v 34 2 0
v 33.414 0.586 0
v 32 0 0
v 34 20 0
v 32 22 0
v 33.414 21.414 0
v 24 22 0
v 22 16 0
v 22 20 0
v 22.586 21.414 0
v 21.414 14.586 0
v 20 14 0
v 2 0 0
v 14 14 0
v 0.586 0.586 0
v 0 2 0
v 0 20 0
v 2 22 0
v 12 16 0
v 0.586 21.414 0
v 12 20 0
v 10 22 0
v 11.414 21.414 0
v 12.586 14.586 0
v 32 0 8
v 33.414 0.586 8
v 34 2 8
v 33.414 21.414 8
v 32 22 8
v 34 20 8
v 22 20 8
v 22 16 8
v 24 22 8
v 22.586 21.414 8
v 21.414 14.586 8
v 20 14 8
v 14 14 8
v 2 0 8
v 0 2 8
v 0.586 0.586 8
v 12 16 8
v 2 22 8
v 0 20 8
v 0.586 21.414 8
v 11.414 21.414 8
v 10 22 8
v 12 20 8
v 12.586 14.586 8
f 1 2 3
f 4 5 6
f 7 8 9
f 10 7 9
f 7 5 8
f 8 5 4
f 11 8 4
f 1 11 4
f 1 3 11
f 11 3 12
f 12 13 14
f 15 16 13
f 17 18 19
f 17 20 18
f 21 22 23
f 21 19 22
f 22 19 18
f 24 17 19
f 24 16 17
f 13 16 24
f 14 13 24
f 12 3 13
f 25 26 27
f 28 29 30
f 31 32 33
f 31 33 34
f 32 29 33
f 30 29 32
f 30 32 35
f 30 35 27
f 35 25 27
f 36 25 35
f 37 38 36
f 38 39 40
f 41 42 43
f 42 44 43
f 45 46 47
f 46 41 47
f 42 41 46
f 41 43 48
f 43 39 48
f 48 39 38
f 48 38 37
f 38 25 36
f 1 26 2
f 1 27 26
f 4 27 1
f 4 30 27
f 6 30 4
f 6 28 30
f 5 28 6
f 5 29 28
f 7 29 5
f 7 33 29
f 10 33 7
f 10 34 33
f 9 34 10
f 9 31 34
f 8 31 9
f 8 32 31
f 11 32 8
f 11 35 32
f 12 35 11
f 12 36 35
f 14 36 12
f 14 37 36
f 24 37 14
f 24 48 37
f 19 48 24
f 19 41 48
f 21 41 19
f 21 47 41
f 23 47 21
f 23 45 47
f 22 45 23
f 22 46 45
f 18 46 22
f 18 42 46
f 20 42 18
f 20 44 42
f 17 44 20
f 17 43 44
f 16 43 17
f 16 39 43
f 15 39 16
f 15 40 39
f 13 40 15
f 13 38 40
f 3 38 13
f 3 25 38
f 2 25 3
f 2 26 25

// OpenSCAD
$fn = 32;

// ----------------------------------------------------------------------
// Eye lug: clevis, 8 mm thick
// ----------------------------------------------------------------------

// --- parameters (mm) ---
profile_height = 8;       // extrusion height
profile_points = 24;      // points of the closed outline

profile = [[0, 2], [0.586, 0.586], [2, 0], [32, 0], [33.414, 0.586], [34, 2], [34, 20], [33.414, 21.414], [32, 22], [24, 22], [22.586, 21.414], [22, 20], [22, 16], [21.414, 14.586], [20, 14], [14, 14], [12.586, 14.586], [12, 16], [12, 20], [11.414, 21.414], [10, 22], [2, 22], [0.586, 21.414], [0, 20]];  // single closed polygon, 24 points, counter clockwise

// --- the one profile operation ---
linear_extrude(height = profile_height) polygon(points = profile);
